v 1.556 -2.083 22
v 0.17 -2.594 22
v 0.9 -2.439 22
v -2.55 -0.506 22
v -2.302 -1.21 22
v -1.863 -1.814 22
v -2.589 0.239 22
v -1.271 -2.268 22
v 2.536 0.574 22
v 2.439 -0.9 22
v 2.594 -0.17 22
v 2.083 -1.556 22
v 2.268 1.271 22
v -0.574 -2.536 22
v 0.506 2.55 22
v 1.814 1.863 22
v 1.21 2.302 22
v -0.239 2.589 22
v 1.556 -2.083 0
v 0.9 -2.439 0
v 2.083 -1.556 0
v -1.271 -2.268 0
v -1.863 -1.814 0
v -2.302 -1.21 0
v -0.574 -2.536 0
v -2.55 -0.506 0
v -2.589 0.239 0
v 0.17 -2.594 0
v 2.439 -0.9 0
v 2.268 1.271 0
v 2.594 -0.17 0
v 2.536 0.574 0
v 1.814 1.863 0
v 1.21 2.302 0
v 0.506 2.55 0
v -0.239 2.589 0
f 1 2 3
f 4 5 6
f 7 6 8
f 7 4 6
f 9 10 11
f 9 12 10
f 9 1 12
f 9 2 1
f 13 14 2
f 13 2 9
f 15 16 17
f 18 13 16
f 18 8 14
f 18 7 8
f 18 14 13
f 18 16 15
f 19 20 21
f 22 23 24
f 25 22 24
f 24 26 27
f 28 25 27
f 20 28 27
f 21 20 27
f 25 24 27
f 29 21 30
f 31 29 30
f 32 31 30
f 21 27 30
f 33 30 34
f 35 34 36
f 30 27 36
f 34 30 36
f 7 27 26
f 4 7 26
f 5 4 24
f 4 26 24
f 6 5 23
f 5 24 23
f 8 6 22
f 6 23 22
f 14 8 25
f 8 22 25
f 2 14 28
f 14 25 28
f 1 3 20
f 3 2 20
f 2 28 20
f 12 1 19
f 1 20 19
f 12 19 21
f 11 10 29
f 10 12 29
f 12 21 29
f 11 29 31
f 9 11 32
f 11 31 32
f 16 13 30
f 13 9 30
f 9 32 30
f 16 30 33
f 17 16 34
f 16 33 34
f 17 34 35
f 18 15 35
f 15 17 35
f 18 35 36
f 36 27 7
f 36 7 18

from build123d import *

# Parameters (mm, degrees)
BOX_W               = 10
BOX_H               = 10
BOX_DEPTH           = 30
CYLINDER_R          = 2.6
CYLINDER_DEPTH      = 22
CUT_PLACEMENT_ANGLE = 45


with BuildPart() as cube:
    # Box → Box (new body)
    with BuildSketch(Plane(origin=(-5, 2, -1), x_dir=(1, 0, 0), z_dir=(0, 0, 1))):
        with Locations((5, 5)):
            Rectangle(BOX_W, BOX_H)
    extrude(amount=BOX_DEPTH)


with BuildPart() as motor_shaft:
    # Cylinder → Cylinder (new body)
    with BuildSketch(Plane.XY):
        Circle(CYLINDER_R)
    extrude(amount=CYLINDER_DEPTH)

    # Cut: cut Cube
    add(cube.part, mode=Mode.SUBTRACT)


with BuildPart() as motor_shaft_1:
    # Cut placement: moved
    add(motor_shaft.part.rotate(Axis((0, 0, 0), (0, 0, 1)), CUT_PLACEMENT_ANGLE))


solid = motor_shaft_1.part
